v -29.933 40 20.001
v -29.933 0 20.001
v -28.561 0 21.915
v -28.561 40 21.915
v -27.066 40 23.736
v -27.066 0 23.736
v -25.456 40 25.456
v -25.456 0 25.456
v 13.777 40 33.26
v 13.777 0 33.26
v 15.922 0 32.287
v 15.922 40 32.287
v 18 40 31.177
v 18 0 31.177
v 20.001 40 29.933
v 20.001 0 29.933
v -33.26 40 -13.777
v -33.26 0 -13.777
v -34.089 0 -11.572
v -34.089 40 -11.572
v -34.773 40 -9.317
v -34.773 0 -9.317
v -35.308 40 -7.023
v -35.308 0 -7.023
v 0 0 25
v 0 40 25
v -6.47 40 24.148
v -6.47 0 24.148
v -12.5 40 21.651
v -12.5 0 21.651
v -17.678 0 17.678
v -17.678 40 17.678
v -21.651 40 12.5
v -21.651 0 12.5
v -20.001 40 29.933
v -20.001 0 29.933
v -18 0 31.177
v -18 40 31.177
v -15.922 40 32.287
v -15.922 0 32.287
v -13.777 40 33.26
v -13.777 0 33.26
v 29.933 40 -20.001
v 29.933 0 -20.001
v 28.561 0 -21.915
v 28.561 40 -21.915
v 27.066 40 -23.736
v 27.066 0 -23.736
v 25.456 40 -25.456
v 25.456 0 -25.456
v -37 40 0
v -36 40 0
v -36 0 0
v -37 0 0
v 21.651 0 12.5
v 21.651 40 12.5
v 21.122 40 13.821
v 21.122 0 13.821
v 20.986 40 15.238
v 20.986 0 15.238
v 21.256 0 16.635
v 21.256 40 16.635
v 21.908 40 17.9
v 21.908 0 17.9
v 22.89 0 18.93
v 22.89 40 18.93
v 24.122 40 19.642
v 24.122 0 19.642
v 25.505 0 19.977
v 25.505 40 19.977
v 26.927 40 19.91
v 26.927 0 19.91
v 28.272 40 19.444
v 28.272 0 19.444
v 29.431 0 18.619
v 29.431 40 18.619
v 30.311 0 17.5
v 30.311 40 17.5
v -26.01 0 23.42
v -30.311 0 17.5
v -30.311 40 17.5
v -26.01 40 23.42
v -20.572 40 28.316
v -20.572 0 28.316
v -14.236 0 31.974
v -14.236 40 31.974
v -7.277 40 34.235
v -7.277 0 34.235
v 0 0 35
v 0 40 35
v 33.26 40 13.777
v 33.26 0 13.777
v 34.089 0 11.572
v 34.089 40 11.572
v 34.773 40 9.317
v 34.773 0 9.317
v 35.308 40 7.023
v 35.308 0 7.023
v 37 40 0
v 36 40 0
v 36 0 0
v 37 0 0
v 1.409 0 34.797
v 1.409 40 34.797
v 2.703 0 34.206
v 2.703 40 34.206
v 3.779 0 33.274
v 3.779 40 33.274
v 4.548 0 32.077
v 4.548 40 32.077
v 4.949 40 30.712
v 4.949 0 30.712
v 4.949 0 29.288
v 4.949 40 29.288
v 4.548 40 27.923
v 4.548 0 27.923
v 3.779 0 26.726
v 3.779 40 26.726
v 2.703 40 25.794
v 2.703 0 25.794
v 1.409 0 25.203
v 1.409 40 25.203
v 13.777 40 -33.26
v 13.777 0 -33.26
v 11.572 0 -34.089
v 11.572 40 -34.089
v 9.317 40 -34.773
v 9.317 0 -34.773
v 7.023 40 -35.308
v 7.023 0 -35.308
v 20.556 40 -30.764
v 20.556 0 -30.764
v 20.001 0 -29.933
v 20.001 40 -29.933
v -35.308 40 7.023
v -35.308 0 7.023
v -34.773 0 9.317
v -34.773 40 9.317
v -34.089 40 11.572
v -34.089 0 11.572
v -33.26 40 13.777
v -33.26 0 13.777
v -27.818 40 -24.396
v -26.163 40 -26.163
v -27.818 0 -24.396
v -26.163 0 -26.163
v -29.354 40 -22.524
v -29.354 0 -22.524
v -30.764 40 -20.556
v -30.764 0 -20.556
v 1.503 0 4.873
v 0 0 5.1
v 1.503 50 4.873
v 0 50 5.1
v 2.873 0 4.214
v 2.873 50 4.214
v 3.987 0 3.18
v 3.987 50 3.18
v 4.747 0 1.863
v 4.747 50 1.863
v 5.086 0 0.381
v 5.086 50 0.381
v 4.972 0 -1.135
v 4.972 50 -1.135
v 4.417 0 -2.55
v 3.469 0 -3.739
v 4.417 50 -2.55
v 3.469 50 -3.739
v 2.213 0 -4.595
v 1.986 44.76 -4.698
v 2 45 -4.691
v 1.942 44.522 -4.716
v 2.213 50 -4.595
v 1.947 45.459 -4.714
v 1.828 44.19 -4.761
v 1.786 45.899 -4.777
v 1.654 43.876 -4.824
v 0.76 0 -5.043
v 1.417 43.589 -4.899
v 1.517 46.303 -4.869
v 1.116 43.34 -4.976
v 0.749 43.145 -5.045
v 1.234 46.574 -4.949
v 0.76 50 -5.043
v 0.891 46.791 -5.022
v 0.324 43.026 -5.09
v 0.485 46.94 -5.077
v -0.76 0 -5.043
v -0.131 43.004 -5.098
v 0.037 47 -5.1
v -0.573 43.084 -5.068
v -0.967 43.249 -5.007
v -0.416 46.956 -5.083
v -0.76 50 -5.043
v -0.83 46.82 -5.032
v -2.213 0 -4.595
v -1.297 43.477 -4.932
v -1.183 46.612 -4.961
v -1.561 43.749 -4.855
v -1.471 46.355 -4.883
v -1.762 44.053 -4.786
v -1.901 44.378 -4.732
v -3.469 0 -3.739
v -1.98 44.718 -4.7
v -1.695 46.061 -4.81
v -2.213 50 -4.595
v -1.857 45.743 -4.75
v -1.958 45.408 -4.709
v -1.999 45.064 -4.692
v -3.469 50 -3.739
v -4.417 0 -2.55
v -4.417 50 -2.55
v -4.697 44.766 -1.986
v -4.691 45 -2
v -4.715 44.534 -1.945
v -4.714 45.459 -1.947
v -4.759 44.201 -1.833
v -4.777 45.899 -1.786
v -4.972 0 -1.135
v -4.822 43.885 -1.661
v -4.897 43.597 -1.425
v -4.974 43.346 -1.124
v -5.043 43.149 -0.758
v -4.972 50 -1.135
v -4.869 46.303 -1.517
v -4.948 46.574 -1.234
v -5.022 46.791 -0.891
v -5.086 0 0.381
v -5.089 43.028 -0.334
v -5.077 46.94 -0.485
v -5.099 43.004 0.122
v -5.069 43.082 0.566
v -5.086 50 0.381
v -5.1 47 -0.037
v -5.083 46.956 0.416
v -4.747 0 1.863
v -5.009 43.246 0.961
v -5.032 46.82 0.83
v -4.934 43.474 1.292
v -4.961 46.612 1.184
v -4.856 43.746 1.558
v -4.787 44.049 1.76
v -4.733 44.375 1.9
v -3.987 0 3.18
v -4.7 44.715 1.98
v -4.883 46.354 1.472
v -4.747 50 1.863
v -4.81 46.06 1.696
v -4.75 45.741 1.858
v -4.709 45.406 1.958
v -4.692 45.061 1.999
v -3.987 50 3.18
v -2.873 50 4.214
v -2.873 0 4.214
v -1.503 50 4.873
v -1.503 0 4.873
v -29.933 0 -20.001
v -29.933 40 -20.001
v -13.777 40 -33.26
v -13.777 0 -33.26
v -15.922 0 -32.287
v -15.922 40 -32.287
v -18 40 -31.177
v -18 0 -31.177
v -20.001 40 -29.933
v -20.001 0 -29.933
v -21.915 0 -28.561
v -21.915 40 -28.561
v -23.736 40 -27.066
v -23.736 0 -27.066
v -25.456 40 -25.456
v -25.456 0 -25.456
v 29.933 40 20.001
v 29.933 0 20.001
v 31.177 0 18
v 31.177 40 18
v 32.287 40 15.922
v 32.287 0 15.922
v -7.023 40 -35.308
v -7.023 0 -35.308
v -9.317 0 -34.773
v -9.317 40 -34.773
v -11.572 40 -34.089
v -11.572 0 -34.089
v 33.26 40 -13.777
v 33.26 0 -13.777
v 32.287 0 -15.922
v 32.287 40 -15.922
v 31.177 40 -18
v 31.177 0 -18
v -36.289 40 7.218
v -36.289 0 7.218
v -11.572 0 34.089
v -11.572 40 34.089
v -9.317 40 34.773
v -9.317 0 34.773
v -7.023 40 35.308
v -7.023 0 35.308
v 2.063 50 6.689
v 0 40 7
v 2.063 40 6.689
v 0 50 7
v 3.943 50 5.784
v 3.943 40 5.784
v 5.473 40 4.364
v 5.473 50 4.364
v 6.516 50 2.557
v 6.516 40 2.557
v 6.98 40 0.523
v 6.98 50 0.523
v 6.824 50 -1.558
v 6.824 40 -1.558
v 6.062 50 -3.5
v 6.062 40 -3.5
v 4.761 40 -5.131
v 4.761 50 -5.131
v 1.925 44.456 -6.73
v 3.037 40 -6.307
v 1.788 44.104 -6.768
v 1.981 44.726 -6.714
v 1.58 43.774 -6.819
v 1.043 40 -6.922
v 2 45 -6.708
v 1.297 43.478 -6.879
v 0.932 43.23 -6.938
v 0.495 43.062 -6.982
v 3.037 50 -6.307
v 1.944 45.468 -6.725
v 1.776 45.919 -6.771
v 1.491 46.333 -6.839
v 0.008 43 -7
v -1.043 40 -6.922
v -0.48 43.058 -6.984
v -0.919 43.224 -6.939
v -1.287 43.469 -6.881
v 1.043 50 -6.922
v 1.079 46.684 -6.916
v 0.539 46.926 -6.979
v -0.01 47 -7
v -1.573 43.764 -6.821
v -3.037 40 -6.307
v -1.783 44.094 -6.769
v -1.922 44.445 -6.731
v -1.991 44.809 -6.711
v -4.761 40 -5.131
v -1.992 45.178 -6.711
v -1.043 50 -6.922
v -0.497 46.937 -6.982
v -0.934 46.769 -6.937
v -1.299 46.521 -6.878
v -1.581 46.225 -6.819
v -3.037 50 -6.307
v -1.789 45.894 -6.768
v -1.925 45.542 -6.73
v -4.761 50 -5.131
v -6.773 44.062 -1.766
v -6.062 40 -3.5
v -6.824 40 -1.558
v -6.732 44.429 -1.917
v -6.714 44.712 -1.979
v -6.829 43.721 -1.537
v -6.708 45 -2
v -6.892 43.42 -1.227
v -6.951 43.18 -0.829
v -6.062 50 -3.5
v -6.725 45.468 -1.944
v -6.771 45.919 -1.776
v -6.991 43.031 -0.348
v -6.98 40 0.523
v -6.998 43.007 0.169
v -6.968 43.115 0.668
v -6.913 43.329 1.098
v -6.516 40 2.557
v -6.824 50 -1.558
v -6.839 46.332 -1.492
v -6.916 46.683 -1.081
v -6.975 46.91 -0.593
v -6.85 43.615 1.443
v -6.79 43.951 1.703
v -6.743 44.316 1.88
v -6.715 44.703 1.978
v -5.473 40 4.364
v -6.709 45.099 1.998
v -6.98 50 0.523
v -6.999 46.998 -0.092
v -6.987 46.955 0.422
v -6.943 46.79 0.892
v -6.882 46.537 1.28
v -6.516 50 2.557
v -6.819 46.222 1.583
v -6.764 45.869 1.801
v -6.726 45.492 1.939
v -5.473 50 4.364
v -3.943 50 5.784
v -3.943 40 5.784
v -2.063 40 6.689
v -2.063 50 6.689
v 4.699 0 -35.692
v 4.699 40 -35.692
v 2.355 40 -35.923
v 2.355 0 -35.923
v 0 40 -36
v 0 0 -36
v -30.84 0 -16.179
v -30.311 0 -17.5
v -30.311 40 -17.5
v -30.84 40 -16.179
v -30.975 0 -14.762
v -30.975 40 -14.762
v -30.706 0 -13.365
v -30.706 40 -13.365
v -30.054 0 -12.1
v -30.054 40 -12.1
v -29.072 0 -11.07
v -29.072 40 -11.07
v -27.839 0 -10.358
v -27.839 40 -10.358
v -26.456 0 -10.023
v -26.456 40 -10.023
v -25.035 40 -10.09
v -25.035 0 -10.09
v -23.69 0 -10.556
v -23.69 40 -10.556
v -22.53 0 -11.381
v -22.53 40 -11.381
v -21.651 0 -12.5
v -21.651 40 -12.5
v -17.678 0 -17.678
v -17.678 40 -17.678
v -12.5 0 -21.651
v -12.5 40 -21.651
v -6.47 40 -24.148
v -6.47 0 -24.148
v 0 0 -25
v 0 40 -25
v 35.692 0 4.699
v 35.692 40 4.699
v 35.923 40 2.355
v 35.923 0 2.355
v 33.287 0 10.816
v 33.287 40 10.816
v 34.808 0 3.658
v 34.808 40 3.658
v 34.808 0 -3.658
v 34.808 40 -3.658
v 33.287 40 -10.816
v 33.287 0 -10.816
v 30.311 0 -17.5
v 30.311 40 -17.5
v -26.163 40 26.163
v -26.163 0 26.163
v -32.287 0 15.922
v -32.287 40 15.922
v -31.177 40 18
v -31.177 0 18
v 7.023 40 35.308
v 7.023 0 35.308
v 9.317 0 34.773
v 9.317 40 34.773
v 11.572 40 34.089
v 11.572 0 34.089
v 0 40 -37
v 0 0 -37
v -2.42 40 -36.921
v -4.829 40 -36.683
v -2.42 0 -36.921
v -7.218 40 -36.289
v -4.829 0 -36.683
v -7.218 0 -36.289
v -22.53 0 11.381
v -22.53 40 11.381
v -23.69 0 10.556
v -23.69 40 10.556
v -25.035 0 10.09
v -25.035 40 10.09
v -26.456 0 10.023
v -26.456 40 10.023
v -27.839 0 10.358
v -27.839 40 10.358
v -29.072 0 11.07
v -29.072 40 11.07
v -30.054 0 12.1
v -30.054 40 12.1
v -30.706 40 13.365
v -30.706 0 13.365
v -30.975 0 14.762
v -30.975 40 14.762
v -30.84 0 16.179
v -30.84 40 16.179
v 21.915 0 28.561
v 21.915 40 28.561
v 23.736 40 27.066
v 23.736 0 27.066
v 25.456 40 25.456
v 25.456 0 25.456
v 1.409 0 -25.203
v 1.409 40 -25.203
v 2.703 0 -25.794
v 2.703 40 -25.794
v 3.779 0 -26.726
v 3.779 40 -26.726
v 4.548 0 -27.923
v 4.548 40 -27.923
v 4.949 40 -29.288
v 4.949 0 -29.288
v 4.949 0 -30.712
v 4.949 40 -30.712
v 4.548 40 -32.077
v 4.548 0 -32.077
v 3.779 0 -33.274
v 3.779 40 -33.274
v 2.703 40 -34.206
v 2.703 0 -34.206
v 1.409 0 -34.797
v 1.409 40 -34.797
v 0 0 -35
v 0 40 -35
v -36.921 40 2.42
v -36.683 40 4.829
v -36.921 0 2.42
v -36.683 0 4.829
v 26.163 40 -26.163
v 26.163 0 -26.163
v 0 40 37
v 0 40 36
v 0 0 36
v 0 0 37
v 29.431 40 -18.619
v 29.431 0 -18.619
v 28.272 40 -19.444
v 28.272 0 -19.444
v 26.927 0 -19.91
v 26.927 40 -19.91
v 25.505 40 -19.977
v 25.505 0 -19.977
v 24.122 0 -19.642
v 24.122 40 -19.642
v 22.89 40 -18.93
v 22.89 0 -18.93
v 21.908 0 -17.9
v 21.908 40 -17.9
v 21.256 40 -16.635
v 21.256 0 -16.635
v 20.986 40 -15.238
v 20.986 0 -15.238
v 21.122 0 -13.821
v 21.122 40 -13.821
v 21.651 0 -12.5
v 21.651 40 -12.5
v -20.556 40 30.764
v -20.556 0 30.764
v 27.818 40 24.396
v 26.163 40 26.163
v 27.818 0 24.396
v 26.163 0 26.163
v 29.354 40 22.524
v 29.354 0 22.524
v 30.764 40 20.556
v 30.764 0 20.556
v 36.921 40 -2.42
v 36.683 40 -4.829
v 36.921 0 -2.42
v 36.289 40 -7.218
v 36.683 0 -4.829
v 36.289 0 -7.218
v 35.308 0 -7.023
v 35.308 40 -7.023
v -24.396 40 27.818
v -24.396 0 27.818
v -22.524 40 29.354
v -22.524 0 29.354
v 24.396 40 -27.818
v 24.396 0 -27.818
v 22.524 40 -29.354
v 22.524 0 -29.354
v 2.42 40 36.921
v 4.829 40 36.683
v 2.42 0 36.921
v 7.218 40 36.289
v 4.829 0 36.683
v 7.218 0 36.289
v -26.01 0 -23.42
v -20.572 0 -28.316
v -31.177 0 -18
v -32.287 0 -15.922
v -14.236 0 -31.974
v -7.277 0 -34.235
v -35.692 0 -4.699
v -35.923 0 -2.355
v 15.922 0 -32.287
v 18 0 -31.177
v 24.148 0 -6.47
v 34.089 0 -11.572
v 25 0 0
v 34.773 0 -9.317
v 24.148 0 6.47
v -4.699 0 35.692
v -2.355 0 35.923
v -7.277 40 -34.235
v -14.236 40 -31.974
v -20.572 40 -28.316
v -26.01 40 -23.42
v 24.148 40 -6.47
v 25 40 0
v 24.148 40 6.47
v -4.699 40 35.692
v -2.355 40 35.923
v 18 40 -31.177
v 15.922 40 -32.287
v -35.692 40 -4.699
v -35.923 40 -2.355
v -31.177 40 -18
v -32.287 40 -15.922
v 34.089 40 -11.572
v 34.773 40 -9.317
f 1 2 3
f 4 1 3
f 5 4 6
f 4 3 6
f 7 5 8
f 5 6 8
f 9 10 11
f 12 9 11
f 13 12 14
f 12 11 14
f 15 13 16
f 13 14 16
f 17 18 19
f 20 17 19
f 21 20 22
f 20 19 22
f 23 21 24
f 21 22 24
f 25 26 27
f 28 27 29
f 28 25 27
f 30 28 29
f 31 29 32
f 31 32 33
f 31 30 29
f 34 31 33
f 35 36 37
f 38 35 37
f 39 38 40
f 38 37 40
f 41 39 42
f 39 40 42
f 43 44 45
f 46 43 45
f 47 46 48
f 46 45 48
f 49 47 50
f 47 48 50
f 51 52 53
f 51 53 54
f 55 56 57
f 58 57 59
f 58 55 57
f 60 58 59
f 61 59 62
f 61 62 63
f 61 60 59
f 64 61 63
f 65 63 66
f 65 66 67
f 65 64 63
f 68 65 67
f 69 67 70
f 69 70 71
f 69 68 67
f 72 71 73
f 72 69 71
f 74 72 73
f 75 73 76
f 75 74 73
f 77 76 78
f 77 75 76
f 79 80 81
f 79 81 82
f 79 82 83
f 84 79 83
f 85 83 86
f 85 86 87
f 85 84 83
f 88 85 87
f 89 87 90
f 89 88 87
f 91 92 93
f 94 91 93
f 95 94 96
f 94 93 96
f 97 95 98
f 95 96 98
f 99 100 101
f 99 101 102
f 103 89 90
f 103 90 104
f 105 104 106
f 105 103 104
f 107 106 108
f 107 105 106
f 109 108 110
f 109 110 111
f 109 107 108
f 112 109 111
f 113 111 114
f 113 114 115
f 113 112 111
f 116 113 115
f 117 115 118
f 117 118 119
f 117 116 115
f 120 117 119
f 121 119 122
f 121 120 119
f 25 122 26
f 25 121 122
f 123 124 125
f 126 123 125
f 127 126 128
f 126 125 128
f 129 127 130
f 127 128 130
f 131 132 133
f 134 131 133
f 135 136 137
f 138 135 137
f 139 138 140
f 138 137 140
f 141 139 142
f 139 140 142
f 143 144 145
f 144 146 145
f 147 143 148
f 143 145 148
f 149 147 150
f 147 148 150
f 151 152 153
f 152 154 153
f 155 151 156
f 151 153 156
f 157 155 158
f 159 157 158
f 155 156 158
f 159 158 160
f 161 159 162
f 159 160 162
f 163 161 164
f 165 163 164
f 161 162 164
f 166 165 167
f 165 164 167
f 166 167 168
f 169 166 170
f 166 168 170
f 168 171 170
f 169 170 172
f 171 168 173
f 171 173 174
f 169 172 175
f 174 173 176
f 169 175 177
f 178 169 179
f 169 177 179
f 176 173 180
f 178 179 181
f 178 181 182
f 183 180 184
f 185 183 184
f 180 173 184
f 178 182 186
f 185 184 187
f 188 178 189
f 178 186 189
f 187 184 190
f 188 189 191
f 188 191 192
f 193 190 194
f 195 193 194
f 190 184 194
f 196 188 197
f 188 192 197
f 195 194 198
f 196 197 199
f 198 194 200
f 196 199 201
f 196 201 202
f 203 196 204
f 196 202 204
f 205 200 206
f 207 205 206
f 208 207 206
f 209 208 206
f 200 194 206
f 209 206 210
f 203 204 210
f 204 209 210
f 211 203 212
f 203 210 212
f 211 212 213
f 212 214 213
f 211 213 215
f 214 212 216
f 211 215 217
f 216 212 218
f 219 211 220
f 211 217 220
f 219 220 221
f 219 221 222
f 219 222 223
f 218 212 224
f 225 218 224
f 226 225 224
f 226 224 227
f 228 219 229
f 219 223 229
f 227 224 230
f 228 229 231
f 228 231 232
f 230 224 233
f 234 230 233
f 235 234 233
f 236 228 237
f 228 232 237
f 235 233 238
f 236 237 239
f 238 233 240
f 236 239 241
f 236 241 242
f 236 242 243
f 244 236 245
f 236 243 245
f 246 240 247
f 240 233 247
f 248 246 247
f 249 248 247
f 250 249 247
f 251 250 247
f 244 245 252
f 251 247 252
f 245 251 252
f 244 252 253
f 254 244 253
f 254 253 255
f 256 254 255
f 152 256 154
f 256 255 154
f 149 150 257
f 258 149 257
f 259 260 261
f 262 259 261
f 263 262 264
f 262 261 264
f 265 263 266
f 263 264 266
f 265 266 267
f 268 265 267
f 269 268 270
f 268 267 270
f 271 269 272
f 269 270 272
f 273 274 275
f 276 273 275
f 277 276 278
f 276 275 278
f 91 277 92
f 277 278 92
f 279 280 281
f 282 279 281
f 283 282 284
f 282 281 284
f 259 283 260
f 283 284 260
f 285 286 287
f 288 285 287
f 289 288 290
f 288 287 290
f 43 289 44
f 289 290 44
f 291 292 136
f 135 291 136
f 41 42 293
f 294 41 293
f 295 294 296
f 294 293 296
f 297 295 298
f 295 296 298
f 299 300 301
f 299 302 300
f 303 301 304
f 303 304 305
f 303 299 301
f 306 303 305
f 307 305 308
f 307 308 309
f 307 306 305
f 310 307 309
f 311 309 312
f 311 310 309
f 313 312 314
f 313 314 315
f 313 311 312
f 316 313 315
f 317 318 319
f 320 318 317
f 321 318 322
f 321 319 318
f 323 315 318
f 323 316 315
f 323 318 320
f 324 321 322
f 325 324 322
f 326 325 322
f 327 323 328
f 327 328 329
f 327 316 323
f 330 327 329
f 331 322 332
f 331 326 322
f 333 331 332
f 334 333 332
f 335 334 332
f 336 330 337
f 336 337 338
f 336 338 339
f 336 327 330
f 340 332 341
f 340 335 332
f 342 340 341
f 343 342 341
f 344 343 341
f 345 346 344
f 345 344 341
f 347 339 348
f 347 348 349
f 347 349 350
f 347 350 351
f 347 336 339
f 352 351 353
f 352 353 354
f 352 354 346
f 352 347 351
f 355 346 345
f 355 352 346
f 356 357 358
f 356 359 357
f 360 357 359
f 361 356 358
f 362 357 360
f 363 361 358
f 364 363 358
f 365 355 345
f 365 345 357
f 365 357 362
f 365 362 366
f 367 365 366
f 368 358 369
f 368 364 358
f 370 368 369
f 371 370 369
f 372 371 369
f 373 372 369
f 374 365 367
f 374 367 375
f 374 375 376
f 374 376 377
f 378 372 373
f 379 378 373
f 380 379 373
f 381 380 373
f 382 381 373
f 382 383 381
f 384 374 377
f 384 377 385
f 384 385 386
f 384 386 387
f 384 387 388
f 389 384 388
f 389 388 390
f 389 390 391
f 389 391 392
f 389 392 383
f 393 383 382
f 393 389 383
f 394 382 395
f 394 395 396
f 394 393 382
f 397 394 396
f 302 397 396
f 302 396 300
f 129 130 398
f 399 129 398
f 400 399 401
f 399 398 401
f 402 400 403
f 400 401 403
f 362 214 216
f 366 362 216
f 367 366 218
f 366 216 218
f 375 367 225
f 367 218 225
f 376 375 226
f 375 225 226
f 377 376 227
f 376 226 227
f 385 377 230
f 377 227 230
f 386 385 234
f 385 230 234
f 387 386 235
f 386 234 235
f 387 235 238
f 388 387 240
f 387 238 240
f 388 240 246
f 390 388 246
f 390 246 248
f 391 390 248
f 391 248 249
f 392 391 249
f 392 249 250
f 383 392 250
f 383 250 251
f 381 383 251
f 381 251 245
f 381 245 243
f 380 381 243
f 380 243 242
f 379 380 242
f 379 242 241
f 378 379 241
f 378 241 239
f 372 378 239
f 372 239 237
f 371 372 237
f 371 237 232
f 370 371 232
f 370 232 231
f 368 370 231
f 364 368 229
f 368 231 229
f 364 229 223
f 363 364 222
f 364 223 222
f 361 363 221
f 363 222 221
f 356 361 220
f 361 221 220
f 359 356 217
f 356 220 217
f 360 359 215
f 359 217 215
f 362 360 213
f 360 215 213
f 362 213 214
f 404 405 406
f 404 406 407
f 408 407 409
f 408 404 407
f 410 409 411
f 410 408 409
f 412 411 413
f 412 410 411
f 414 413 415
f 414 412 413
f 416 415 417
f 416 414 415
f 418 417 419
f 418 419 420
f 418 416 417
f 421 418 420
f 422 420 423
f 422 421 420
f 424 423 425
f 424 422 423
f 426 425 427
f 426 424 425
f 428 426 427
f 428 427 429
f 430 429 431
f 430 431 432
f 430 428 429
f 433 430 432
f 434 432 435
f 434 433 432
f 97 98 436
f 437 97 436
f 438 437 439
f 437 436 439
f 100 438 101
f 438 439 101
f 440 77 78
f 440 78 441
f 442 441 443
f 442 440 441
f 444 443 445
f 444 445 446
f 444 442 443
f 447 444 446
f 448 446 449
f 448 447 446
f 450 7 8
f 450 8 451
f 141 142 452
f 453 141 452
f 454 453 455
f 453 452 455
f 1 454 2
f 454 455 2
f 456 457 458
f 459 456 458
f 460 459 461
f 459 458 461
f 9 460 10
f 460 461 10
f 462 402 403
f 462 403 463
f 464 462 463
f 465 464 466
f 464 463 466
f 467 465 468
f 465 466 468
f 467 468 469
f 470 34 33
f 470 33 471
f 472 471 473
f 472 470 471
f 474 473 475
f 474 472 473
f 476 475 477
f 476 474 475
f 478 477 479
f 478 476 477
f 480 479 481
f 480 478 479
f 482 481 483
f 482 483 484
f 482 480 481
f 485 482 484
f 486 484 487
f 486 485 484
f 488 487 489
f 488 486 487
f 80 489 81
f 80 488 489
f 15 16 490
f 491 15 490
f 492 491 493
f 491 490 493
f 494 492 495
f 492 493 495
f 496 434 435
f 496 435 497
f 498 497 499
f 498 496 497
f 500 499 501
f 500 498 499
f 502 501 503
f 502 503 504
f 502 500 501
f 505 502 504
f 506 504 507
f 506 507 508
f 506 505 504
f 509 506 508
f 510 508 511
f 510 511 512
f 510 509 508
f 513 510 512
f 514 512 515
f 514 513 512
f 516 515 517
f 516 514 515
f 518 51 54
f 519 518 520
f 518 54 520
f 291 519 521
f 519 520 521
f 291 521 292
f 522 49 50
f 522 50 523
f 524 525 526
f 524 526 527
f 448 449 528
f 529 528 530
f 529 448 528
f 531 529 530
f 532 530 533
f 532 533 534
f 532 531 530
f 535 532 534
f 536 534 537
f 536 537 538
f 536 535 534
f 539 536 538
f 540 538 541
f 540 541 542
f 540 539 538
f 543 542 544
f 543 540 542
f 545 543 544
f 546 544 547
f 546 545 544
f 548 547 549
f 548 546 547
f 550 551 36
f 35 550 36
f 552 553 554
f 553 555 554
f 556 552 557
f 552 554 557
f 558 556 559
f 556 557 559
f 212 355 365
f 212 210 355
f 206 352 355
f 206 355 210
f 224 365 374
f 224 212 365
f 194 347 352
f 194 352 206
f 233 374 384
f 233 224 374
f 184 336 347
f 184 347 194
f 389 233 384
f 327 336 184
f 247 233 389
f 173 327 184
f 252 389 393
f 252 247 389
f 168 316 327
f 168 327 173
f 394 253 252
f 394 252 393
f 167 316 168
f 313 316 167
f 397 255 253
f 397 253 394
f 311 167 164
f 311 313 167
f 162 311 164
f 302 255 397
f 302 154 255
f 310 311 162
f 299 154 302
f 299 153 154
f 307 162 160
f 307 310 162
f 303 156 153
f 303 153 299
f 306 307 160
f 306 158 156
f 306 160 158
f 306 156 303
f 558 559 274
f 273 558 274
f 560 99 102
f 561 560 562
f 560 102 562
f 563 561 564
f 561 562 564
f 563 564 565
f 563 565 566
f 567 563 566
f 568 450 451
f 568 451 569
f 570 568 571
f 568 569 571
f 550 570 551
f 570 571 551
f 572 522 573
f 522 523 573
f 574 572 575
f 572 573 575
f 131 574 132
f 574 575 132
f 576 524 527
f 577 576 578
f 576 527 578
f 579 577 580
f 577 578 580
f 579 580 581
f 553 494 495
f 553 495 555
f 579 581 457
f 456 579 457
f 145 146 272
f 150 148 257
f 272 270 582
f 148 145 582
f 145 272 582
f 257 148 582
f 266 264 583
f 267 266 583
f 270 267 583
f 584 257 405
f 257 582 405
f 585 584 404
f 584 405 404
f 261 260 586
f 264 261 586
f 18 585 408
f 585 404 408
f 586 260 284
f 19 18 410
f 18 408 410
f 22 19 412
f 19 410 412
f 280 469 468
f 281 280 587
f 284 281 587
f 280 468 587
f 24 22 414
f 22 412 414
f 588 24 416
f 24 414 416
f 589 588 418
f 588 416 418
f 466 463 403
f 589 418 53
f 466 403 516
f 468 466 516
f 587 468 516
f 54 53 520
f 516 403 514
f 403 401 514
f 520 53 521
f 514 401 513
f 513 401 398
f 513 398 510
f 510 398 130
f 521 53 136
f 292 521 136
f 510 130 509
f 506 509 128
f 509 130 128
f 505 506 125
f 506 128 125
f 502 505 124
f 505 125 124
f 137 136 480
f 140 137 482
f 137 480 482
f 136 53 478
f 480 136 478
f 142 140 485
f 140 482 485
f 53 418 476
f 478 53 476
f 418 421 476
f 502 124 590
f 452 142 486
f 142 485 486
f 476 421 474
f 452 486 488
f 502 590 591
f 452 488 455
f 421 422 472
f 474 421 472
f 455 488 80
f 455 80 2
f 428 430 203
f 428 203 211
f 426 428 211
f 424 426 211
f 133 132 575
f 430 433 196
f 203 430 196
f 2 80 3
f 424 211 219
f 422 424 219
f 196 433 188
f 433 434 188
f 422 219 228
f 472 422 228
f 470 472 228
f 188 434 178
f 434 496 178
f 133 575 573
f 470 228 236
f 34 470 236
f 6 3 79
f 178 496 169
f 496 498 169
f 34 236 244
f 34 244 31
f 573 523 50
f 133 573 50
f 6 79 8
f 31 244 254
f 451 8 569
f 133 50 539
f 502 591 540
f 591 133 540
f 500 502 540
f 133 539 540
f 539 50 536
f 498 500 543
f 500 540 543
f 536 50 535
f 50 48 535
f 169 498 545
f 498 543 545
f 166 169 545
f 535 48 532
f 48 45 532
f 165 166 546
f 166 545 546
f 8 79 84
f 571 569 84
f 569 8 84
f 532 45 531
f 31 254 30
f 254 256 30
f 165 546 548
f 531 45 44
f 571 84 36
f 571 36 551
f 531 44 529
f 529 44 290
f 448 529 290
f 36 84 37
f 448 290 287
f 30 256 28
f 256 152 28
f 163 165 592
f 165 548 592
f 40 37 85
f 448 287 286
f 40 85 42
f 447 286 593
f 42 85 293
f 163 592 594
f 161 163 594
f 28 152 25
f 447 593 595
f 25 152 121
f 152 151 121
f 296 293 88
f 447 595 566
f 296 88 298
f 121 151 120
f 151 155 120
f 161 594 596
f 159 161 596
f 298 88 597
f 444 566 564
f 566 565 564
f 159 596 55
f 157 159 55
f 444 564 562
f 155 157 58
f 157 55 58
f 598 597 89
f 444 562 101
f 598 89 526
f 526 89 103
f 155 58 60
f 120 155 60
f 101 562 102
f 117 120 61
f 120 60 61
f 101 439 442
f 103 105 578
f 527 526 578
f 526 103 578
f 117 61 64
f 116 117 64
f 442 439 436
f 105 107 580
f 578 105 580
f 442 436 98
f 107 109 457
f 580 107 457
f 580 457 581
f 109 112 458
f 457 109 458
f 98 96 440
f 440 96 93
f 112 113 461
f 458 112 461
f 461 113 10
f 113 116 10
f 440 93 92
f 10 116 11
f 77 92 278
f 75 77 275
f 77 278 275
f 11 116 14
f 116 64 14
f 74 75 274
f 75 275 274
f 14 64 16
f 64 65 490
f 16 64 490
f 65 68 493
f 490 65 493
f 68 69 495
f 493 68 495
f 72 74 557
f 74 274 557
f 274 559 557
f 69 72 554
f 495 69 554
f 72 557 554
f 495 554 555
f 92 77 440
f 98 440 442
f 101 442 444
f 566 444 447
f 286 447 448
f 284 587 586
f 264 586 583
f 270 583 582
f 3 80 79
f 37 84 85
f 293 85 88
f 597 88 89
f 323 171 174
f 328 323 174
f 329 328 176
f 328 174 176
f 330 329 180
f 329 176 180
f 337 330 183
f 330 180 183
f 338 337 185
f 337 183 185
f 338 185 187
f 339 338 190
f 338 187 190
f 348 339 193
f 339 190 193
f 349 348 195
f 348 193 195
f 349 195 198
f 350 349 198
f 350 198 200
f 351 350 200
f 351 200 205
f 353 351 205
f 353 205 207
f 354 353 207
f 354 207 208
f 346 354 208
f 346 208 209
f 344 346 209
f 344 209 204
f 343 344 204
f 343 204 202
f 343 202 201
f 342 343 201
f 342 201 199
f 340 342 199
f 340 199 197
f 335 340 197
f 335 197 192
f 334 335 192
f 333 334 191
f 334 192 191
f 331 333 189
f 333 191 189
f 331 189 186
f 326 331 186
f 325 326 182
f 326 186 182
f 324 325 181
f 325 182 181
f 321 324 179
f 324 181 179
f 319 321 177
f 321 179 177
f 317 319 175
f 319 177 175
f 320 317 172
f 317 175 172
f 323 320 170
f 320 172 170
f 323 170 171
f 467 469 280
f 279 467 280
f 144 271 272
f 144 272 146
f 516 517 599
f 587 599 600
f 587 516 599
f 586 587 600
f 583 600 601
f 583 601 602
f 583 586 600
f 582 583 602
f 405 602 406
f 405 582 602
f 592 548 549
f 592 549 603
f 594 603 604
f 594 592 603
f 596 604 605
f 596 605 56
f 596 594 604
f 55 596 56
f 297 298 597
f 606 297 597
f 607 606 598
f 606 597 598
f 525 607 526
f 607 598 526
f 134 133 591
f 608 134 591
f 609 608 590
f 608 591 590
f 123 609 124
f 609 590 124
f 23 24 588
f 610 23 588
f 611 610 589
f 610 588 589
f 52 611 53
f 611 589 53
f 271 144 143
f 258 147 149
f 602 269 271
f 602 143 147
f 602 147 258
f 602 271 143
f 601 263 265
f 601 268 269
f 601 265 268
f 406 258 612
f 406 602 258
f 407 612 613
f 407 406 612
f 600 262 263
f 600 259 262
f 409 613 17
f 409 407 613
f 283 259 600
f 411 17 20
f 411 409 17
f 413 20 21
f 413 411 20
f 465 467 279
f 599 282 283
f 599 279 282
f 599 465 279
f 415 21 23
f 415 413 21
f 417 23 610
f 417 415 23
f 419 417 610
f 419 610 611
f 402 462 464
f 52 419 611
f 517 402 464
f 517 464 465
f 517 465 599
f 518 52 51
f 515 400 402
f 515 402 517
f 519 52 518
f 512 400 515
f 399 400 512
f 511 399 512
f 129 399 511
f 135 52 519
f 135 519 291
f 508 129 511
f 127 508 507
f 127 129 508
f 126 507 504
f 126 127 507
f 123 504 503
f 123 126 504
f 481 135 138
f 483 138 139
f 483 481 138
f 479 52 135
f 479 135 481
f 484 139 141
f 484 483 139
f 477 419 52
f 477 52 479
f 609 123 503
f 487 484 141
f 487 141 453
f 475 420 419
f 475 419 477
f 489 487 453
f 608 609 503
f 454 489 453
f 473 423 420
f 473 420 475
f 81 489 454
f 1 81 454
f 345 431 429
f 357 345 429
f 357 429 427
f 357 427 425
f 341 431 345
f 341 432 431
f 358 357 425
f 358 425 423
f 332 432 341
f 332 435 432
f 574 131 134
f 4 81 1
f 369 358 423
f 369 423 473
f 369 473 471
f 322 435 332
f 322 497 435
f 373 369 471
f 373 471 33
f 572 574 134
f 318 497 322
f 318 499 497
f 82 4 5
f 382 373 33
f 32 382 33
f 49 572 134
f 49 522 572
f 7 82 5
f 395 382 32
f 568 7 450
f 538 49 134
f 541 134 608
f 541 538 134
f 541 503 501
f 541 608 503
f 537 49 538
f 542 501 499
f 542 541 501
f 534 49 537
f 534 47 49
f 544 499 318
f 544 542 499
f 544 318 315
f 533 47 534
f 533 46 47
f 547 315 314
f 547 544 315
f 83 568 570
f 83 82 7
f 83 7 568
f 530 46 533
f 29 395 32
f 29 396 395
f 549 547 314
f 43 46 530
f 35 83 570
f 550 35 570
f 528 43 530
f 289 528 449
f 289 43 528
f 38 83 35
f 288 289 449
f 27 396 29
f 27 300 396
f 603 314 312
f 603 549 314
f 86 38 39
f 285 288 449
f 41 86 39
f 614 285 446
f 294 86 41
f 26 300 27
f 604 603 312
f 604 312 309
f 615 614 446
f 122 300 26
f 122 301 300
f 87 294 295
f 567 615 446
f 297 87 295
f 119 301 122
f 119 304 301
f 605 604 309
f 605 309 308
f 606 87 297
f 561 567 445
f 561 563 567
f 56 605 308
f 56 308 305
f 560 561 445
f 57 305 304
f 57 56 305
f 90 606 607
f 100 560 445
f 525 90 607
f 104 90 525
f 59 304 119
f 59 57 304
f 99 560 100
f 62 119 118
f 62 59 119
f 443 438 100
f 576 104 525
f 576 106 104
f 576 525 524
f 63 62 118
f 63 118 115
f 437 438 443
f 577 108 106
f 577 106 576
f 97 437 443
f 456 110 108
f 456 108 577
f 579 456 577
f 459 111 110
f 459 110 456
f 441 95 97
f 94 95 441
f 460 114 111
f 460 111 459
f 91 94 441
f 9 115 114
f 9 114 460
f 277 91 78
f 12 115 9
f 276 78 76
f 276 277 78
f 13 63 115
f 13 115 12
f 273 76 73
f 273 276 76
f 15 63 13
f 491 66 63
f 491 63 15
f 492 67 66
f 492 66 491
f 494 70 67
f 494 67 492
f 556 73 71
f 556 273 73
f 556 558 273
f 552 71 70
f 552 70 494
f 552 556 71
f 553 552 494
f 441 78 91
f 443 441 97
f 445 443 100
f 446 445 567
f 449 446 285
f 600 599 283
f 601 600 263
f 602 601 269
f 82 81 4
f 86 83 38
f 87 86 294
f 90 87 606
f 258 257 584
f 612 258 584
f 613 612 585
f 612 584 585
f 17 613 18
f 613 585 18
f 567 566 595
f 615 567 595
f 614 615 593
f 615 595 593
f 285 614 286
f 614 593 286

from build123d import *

# Parameters (mm, degrees)
SKETCH_1_R               = 37
EXTRUDE_1_DEPTH          = 40
SKETCH_2_R               = 5.1
CUT_EXTRUDE_1_DEPTH      = 40
CUT_EXTRUDE_START        = -40
CUT_EXTRUDE_2_DEPTH      = 40
SKETCH_4_R               = 7
SKETCH_4_R_2             = 5.1
EXTRUDE_2_DEPTH          = 10
CUT_EXTRUDE_3_REACH      = 74.374
CUT_EXTRUDE_3_END_RADIUS = 7
SKETCH_6_R               = 2
CUT_EXTRUDE_4_REACH      = 74.374
CUT_EXTRUDE_4_END_RADIUS = 7
SKETCH_7_R               = 2
CUT_EXTRUDE_7_REACH      = 74.374


# Read off the part's stored shape, not the designer's step: the extrude step
with BuildPart() as part:
    # 草图1 → 凸台-拉伸1 (new body)
    with BuildSketch(Plane(origin=(0, 0, 0), x_dir=(1, 0, 0), z_dir=(0, 1, 0))):
        with Locations(Location((0, 0, 0), (0, 0, 270))):
            Circle(SKETCH_1_R)
    extrude(amount=EXTRUDE_1_DEPTH)

    # 草图2 → 切除-拉伸1 (cut)
    with BuildSketch(Plane(origin=(0, 40, 0), x_dir=(1, 0, 0), z_dir=(0, 1, 0))):
        with Locations(Location((0, 0, 0), (0, 0, 270))):
            Circle(SKETCH_2_R)
    extrude(amount=-CUT_EXTRUDE_1_DEPTH, mode=Mode.SUBTRACT)

    # 切除-拉伸2 outline → 切除-拉伸2 (cut)
    with BuildSketch(Plane(origin=(0, 40, 0), x_dir=(1, 0, 0), z_dir=(0, 1, 0)).offset(CUT_EXTRUDE_START)):
        with BuildLine():
            ThreePointArc((0, 25), (5, 30), (0, 35))
            ThreePointArc((0, 35), (-17.5, 30.310889132), (-30.310889132, 17.5))
            ThreePointArc((-30.310889132, 17.5), (-28.480762114, 10.669872981), (-21.650635095, 12.5))
            ThreePointArc((-21.650635095, 12.5), (-12.5, 21.650635095), (0, 25))
        make_face()
        with BuildLine():
            ThreePointArc((-21.650635095, -12.5), (-28.480762114, -10.669872981), (-30.310889132, -17.5))
            ThreePointArc((-30.310889132, -17.5), (-17.5, -30.310889132), (0, -35))
            ThreePointArc((0, -35), (5, -30), (0, -25))
            ThreePointArc((0, -25), (-12.5, -21.650635095), (-21.650635095, -12.5))
        make_face()
        with BuildLine():
            ThreePointArc((21.650635095, -12.5), (23.480762113, -19.330127019), (30.310889132, -17.5))
            ThreePointArc((30.310889132, -17.5), (35, 0), (30.310889132, 17.5))
            ThreePointArc((30.310889132, 17.5), (23.480762113, 19.330127019), (21.650635095, 12.5))
            ThreePointArc((21.650635095, 12.5), (25, 0), (21.650635095, -12.5))
        make_face()
    extrude(amount=CUT_EXTRUDE_2_DEPTH, mode=Mode.SUBTRACT)

    # 草图4 → 凸台-拉伸2 (add, symmetric)
    with BuildSketch(Plane(origin=(0, 40, 0), x_dir=(1, 0, 0), z_dir=(0, 1, 0))):
        with Locations(Location((0, 0, 0), (0, 0, 270))):
            Circle(SKETCH_4_R)
        with Locations(Location((0, 0, 0), (0, 0, 270))):
            Circle(SKETCH_4_R_2, mode=Mode.SUBTRACT)
    extrude(amount=EXTRUDE_2_DEPTH, both=True)

    # 切除-拉伸3: up to this cylinder (the profile starts inside it)
    cut_extrude_3_end = Plane(origin=(0, 45, 0), z_dir=(0, -1, 0)) * Cylinder(CUT_EXTRUDE_3_END_RADIUS, 163.748, mode=Mode.PRIVATE)
    # 草图6 → 切除-拉伸3 (cut, up to the surface)
    with BuildSketch(Plane.XY, mode=Mode.PRIVATE) as cut_extrude_3_sk1:
        with Locations((0, 45)):
            Circle(SKETCH_6_R)
    cut_extrude_3_tool1 = extrude(cut_extrude_3_sk1.sketch, amount=-CUT_EXTRUDE_3_REACH, mode=Mode.PRIVATE) & cut_extrude_3_end
    add(cut_extrude_3_tool1.solids().sort_by_distance((0, 45, 0))[0], mode=Mode.SUBTRACT)

    # 切除-拉伸4: up to this cylinder (the profile starts inside it)
    cut_extrude_4_end = Plane(origin=(0, 45, 0), z_dir=(0, -1, 0)) * Cylinder(CUT_EXTRUDE_4_END_RADIUS, 163.748, mode=Mode.PRIVATE)
    # 草图7 → 切除-拉伸4 (cut, up to the surface)
    with BuildSketch(Plane(origin=(0, 0, 0), x_dir=(0, 0, -1), z_dir=(1, 0, 0)), mode=Mode.PRIVATE) as cut_extrude_4_sk1:
        with Locations((0, 45)):
            Circle(SKETCH_7_R)
    cut_extrude_4_tool1 = extrude(cut_extrude_4_sk1.sketch, amount=-CUT_EXTRUDE_4_REACH, mode=Mode.PRIVATE) & cut_extrude_4_end
    add(cut_extrude_4_tool1.solids().sort_by_distance((0, 45, 0))[0], mode=Mode.SUBTRACT)

    # 草图10 → 切除-拉伸7 (cut, up to next)
    with BuildSketch(Plane.XZ, mode=Mode.PRIVATE) as cut_extrude_7_sk1:
        with BuildLine():
            Line((-36.289055375, 7.218341915), (-35.308270095, 7.023251593))
            ThreePointArc((-35.308270095, 7.023251593), (-34.449852086, 10.450248381), (-33.25966317, 13.776603565))
            Line((-33.25966317, 13.776603565), (-34.183542703, 14.159286998))
            ThreePointArc((-34.183542703, 14.159286998), (-35.406792422, 10.740533058), (-36.289055375, 7.218341915))
        make_face()
    cut_extrude_7_tool1 = extrude(cut_extrude_7_sk1.sketch, amount=-CUT_EXTRUDE_7_REACH, mode=Mode.PRIVATE) & part.part
    # 草图10 → 切除-拉伸7 (cut, up to next)
    with BuildSketch(Plane.XZ, mode=Mode.PRIVATE) as cut_extrude_7_sk2:
        with BuildLine():
            Line((-34.183542703, 14.159286998), (-33.25966317, 13.776603565))
            ThreePointArc((-33.25966317, 13.776603565), (-31.749165517, 16.970282526), (-29.932906043, 20.000528389))
            Line((-29.932906043, 20.000528389), (-30.764375655, 20.556098622))
            ThreePointArc((-30.764375655, 20.556098622), (-32.631086781, 17.441679263), (-34.183542703, 14.159286998))
        make_face()
    cut_extrude_7_tool2 = extrude(cut_extrude_7_sk2.sketch, amount=-CUT_EXTRUDE_7_REACH, mode=Mode.PRIVATE) & part.part
    # 草图10 → 切除-拉伸7 (cut, up to next)
    with BuildSketch(Plane.XZ, mode=Mode.PRIVATE) as cut_extrude_7_sk3:
        with BuildLine():
            Line((-30.764375655, 20.556098622), (-29.932906043, 20.000528389))
            ThreePointArc((-29.932906043, 20.000528389), (-27.828376321, 22.83815823), (-25.455844123, 25.455844123))
            Line((-25.455844123, 25.455844123), (-26.162950904, 26.162950904))
            ThreePointArc((-26.162950904, 26.162950904), (-28.601386774, 23.472551514), (-30.764375655, 20.556098622))
        make_face()
    cut_extrude_7_tool3 = extrude(cut_extrude_7_sk3.sketch, amount=-CUT_EXTRUDE_7_REACH, mode=Mode.PRIVATE) & part.part
    # 草图10 → 切除-拉伸7 (cut, up to next)
    with BuildSketch(Plane.XZ, mode=Mode.PRIVATE) as cut_extrude_7_sk4:
        with BuildLine():
            Line((-20.556098622, 30.764375655), (-20.000528389, 29.932906043))
            ThreePointArc((-20.000528389, 29.932906043), (-16.970282526, 31.749165517), (-13.776603565, 33.25966317))
            Line((-13.776603565, 33.25966317), (-14.159286998, 34.183542703))
            ThreePointArc((-14.159286998, 34.183542703), (-17.441679263, 32.631086781), (-20.556098622, 30.764375655))
        make_face()
    cut_extrude_7_tool4 = extrude(cut_extrude_7_sk4.sketch, amount=-CUT_EXTRUDE_7_REACH, mode=Mode.PRIVATE) & part.part
    # 草图10 → 切除-拉伸7 (cut, up to next)
    with BuildSketch(Plane.XZ, mode=Mode.PRIVATE) as cut_extrude_7_sk5:
        with BuildLine():
            Line((-14.159286998, 34.183542703), (-13.776603565, 33.25966317))
            ThreePointArc((-13.776603565, 33.25966317), (-10.450248381, 34.449852086), (-7.023251593, 35.308270095))
            Line((-7.023251593, 35.308270095), (-7.218341915, 36.289055375))
            ThreePointArc((-7.218341915, 36.289055375), (-10.740533058, 35.406792422), (-14.159286998, 34.183542703))
        make_face()
    cut_extrude_7_tool5 = extrude(cut_extrude_7_sk5.sketch, amount=-CUT_EXTRUDE_7_REACH, mode=Mode.PRIVATE) & part.part
    # 草图10 → 切除-拉伸7 (cut, up to next)
    with BuildSketch(Plane.XZ, mode=Mode.PRIVATE) as cut_extrude_7_sk6:
        with BuildLine():
            ThreePointArc((-7.023251593, 35.308270095), (-3.528617052, 35.82665016), (0, 36))
            Line((0, 36), (0, 37))
            ThreePointArc((0, 37), (-3.626634192, 36.821834887), (-7.218341915, 36.289055375))
            Line((-7.218341915, 36.289055375), (-7.023251593, 35.308270095))
        make_face()
    cut_extrude_7_tool6 = extrude(cut_extrude_7_sk6.sketch, amount=-CUT_EXTRUDE_7_REACH, mode=Mode.PRIVATE) & part.part
    # 草图10 → 切除-拉伸7 (cut, up to next)
    with BuildSketch(Plane.XZ, mode=Mode.PRIVATE) as cut_extrude_7_sk7:
        with BuildLine():
            Line((7.218341915, 36.289055375), (7.023251593, 35.308270095))
            ThreePointArc((7.023251593, 35.308270095), (10.450248381, 34.449852086), (13.776603565, 33.25966317))
            Line((13.776603565, 33.25966317), (14.159286998, 34.183542703))
            ThreePointArc((14.159286998, 34.183542703), (10.740533058, 35.406792422), (7.218341915, 36.289055375))
        make_face()
    cut_extrude_7_tool7 = extrude(cut_extrude_7_sk7.sketch, amount=-CUT_EXTRUDE_7_REACH, mode=Mode.PRIVATE) & part.part
    # 草图10 → 切除-拉伸7 (cut, up to next)
    with BuildSketch(Plane.XZ, mode=Mode.PRIVATE) as cut_extrude_7_sk8:
        with BuildLine():
            Line((14.159286998, 34.183542703), (13.776603565, 33.25966317))
            ThreePointArc((13.776603565, 33.25966317), (16.970282526, 31.749165517), (20.000528389, 29.932906043))
            Line((20.000528389, 29.932906043), (20.556098622, 30.764375655))
            ThreePointArc((20.556098622, 30.764375655), (17.441679263, 32.631086781), (14.159286998, 34.183542703))
        make_face()
    cut_extrude_7_tool8 = extrude(cut_extrude_7_sk8.sketch, amount=-CUT_EXTRUDE_7_REACH, mode=Mode.PRIVATE) & part.part
    # 草图10 → 切除-拉伸7 (cut, up to next)
    with BuildSketch(Plane.XZ, mode=Mode.PRIVATE) as cut_extrude_7_sk9:
        with BuildLine():
            Line((20.556098622, 30.764375655), (20.000528389, 29.932906043))
            ThreePointArc((20.000528389, 29.932906043), (22.83815823, 27.828376321), (25.455844123, 25.455844123))
            Line((25.455844123, 25.455844123), (26.162950904, 26.162950904))
            ThreePointArc((26.162950904, 26.162950904), (23.472551514, 28.601386774), (20.556098622, 30.764375655))
        make_face()
    cut_extrude_7_tool9 = extrude(cut_extrude_7_sk9.sketch, amount=-CUT_EXTRUDE_7_REACH, mode=Mode.PRIVATE) & part.part
    # 草图10 → 切除-拉伸7 (cut, up to next)
    with BuildSketch(Plane.XZ, mode=Mode.PRIVATE) as cut_extrude_7_sk10:
        with BuildLine():
            Line((30.764375655, 20.556098622), (29.932906043, 20.000528389))
            ThreePointArc((29.932906043, 20.000528389), (31.749165517, 16.970282526), (33.25966317, 13.776603565))
            Line((33.25966317, 13.776603565), (34.183542703, 14.159286998))
            ThreePointArc((34.183542703, 14.159286998), (32.631086781, 17.441679263), (30.764375655, 20.556098622))
        make_face()
    cut_extrude_7_tool10 = extrude(cut_extrude_7_sk10.sketch, amount=-CUT_EXTRUDE_7_REACH, mode=Mode.PRIVATE) & part.part
    # 草图10 → 切除-拉伸7 (cut, up to next)
    with BuildSketch(Plane.XZ, mode=Mode.PRIVATE) as cut_extrude_7_sk11:
        with BuildLine():
            Line((34.183542703, 14.159286998), (33.25966317, 13.776603565))
            ThreePointArc((33.25966317, 13.776603565), (34.449852086, 10.450248381), (35.308270095, 7.023251593))
            Line((35.308270095, 7.023251593), (36.289055375, 7.218341915))
            ThreePointArc((36.289055375, 7.218341915), (35.406792422, 10.740533058), (34.183542703, 14.159286998))
        make_face()
    cut_extrude_7_tool11 = extrude(cut_extrude_7_sk11.sketch, amount=-CUT_EXTRUDE_7_REACH, mode=Mode.PRIVATE) & part.part
    # 草图10 → 切除-拉伸7 (cut, up to next)
    with BuildSketch(Plane.XZ, mode=Mode.PRIVATE) as cut_extrude_7_sk12:
        with BuildLine():
            Line((36.289055375, 7.218341915), (35.308270095, 7.023251593))
            ThreePointArc((35.308270095, 7.023251593), (35.82665016, 3.528617052), (36, 0))
            Line((36, 0), (37, 0))
            ThreePointArc((37, 0), (36.821834887, 3.626634192), (36.289055375, 7.218341915))
        make_face()
    cut_extrude_7_tool12 = extrude(cut_extrude_7_sk12.sketch, amount=-CUT_EXTRUDE_7_REACH, mode=Mode.PRIVATE) & part.part
    # 草图10 → 切除-拉伸7 (cut, up to next)
    with BuildSketch(Plane.XZ, mode=Mode.PRIVATE) as cut_extrude_7_sk13:
        with BuildLine():
            Line((36.289055375, -7.218341915), (35.308270095, -7.023251593))
            ThreePointArc((35.308270095, -7.023251593), (34.449852086, -10.450248381), (33.25966317, -13.776603565))
            Line((33.25966317, -13.776603565), (34.183542703, -14.159286998))
            ThreePointArc((34.183542703, -14.159286998), (35.406792422, -10.740533058), (36.289055375, -7.218341915))
        make_face()
    cut_extrude_7_tool13 = extrude(cut_extrude_7_sk13.sketch, amount=-CUT_EXTRUDE_7_REACH, mode=Mode.PRIVATE) & part.part
    # 草图10 → 切除-拉伸7 (cut, up to next)
    with BuildSketch(Plane.XZ, mode=Mode.PRIVATE) as cut_extrude_7_sk14:
        with BuildLine():
            Line((34.183542703, -14.159286998), (33.25966317, -13.776603565))
            ThreePointArc((33.25966317, -13.776603565), (31.749165517, -16.970282526), (29.932906043, -20.000528389))
            Line((29.932906043, -20.000528389), (30.764375655, -20.556098622))
            ThreePointArc((30.764375655, -20.556098622), (32.631086781, -17.441679263), (34.183542703, -14.159286998))
        make_face()
    cut_extrude_7_tool14 = extrude(cut_extrude_7_sk14.sketch, amount=-CUT_EXTRUDE_7_REACH, mode=Mode.PRIVATE) & part.part
    # 草图10 → 切除-拉伸7 (cut, up to next)
    with BuildSketch(Plane.XZ, mode=Mode.PRIVATE) as cut_extrude_7_sk15:
        with BuildLine():
            Line((30.764375655, -20.556098622), (29.932906043, -20.000528389))
            ThreePointArc((29.932906043, -20.000528389), (27.828376321, -22.83815823), (25.455844123, -25.455844123))
            Line((25.455844123, -25.455844123), (26.162950904, -26.162950904))
            ThreePointArc((26.162950904, -26.162950904), (28.601386774, -23.472551514), (30.764375655, -20.556098622))
        make_face()
    cut_extrude_7_tool15 = extrude(cut_extrude_7_sk15.sketch, amount=-CUT_EXTRUDE_7_REACH, mode=Mode.PRIVATE) & part.part
    # 草图10 → 切除-拉伸7 (cut, up to next)
    with BuildSketch(Plane.XZ, mode=Mode.PRIVATE) as cut_extrude_7_sk16:
        with BuildLine():
            Line((20.556098622, -30.764375655), (20.000528389, -29.932906043))
            ThreePointArc((20.000528389, -29.932906043), (16.970282526, -31.749165517), (13.776603565, -33.25966317))
            Line((13.776603565, -33.25966317), (14.159286998, -34.183542703))
            ThreePointArc((14.159286998, -34.183542703), (17.441679263, -32.631086781), (20.556098622, -30.764375655))
        make_face()
    cut_extrude_7_tool16 = extrude(cut_extrude_7_sk16.sketch, amount=-CUT_EXTRUDE_7_REACH, mode=Mode.PRIVATE) & part.part
    # 草图10 → 切除-拉伸7 (cut, up to next)
    with BuildSketch(Plane.XZ, mode=Mode.PRIVATE) as cut_extrude_7_sk17:
        with BuildLine():
            Line((14.159286998, -34.183542703), (13.776603565, -33.25966317))
            ThreePointArc((13.776603565, -33.25966317), (10.450248381, -34.449852086), (7.023251593, -35.308270095))
            Line((7.023251593, -35.308270095), (7.218341915, -36.289055375))
            ThreePointArc((7.218341915, -36.289055375), (10.740533058, -35.406792422), (14.159286998, -34.183542703))
        make_face()
    cut_extrude_7_tool17 = extrude(cut_extrude_7_sk17.sketch, amount=-CUT_EXTRUDE_7_REACH, mode=Mode.PRIVATE) & part.part
    # 草图10 → 切除-拉伸7 (cut, up to next)
    with BuildSketch(Plane.XZ, mode=Mode.PRIVATE) as cut_extrude_7_sk18:
        with BuildLine():
            Line((7.218341915, -36.289055375), (7.023251593, -35.308270095))
            ThreePointArc((7.023251593, -35.308270095), (3.528617052, -35.82665016), (0, -36))
            Line((0, -36), (0, -37))
            ThreePointArc((0, -37), (3.626634192, -36.821834887), (7.218341915, -36.289055375))
        make_face()
    cut_extrude_7_tool18 = extrude(cut_extrude_7_sk18.sketch, amount=-CUT_EXTRUDE_7_REACH, mode=Mode.PRIVATE) & part.part
    # 草图10 → 切除-拉伸7 (cut, up to next)
    with BuildSketch(Plane.XZ, mode=Mode.PRIVATE) as cut_extrude_7_sk19:
        with BuildLine():
            Line((-7.218341915, -36.289055375), (-7.023251593, -35.308270095))
            ThreePointArc((-7.023251593, -35.308270095), (-10.450248381, -34.449852086), (-13.776603565, -33.25966317))
            Line((-13.776603565, -33.25966317), (-14.159286998, -34.183542703))
            ThreePointArc((-14.159286998, -34.183542703), (-10.740533058, -35.406792422), (-7.218341915, -36.289055375))
        make_face()
    cut_extrude_7_tool19 = extrude(cut_extrude_7_sk19.sketch, amount=-CUT_EXTRUDE_7_REACH, mode=Mode.PRIVATE) & part.part
    # 草图10 → 切除-拉伸7 (cut, up to next)
    with BuildSketch(Plane.XZ, mode=Mode.PRIVATE) as cut_extrude_7_sk20:
        with BuildLine():
            Line((-14.159286998, -34.183542703), (-13.776603565, -33.25966317))
            ThreePointArc((-13.776603565, -33.25966317), (-16.970282526, -31.749165517), (-20.000528389, -29.932906043))
            Line((-20.000528389, -29.932906043), (-20.556098622, -30.764375655))
            ThreePointArc((-20.556098622, -30.764375655), (-17.441679263, -32.631086781), (-14.159286998, -34.183542703))
        make_face()
    cut_extrude_7_tool20 = extrude(cut_extrude_7_sk20.sketch, amount=-CUT_EXTRUDE_7_REACH, mode=Mode.PRIVATE) & part.part
    # 草图10 → 切除-拉伸7 (cut, up to next)
    with BuildSketch(Plane.XZ, mode=Mode.PRIVATE) as cut_extrude_7_sk21:
        with BuildLine():
            Line((-20.556098622, -30.764375655), (-20.000528389, -29.932906043))
            ThreePointArc((-20.000528389, -29.932906043), (-22.83815823, -27.828376321), (-25.455844123, -25.455844123))
            Line((-25.455844123, -25.455844123), (-26.162950904, -26.162950904))
            ThreePointArc((-26.162950904, -26.162950904), (-23.472551514, -28.601386774), (-20.556098622, -30.764375655))
        make_face()
    cut_extrude_7_tool21 = extrude(cut_extrude_7_sk21.sketch, amount=-CUT_EXTRUDE_7_REACH, mode=Mode.PRIVATE) & part.part
    # 草图10 → 切除-拉伸7 (cut, up to next)
    with BuildSketch(Plane.XZ, mode=Mode.PRIVATE) as cut_extrude_7_sk22:
        with BuildLine():
            Line((-30.764375655, -20.556098622), (-29.932906043, -20.000528389))
            ThreePointArc((-29.932906043, -20.000528389), (-31.749165517, -16.970282526), (-33.25966317, -13.776603565))
            Line((-33.25966317, -13.776603565), (-34.183542703, -14.159286998))
            ThreePointArc((-34.183542703, -14.159286998), (-32.631086781, -17.441679263), (-30.764375655, -20.556098622))
        make_face()
    cut_extrude_7_tool22 = extrude(cut_extrude_7_sk22.sketch, amount=-CUT_EXTRUDE_7_REACH, mode=Mode.PRIVATE) & part.part
    # 草图10 → 切除-拉伸7 (cut, up to next)
    with BuildSketch(Plane.XZ, mode=Mode.PRIVATE) as cut_extrude_7_sk23:
        with BuildLine():
            Line((-34.183542703, -14.159286998), (-33.25966317, -13.776603565))
            ThreePointArc((-33.25966317, -13.776603565), (-34.449852086, -10.450248381), (-35.308270095, -7.023251593))
            Line((-35.308270095, -7.023251593), (-36.289055375, -7.218341915))
            ThreePointArc((-36.289055375, -7.218341915), (-35.406792422, -10.740533058), (-34.183542703, -14.159286998))
        make_face()
    cut_extrude_7_tool23 = extrude(cut_extrude_7_sk23.sketch, amount=-CUT_EXTRUDE_7_REACH, mode=Mode.PRIVATE) & part.part
    # 草图10 → 切除-拉伸7 (cut, up to next)
    with BuildSketch(Plane.XZ, mode=Mode.PRIVATE) as cut_extrude_7_sk24:
        with BuildLine():
            Line((-36.289055375, -7.218341915), (-35.308270095, -7.023251593))
            ThreePointArc((-35.308270095, -7.023251593), (-35.82665016, -3.528617052), (-36, 0))
            Line((-36, 0), (-37, 0))
            ThreePointArc((-37, 0), (-36.821834887, -3.626634192), (-36.289055375, -7.218341915))
        make_face()
    cut_extrude_7_tool24 = extrude(cut_extrude_7_sk24.sketch, amount=-CUT_EXTRUDE_7_REACH, mode=Mode.PRIVATE) & part.part
    add(cut_extrude_7_tool1.solids().sort_by_distance((-34.874422, 0, 10.57904))[0], mode=Mode.SUBTRACT)
    add(cut_extrude_7_tool2.solids().sort_by_distance((-32.140452, 0, 17.179429))[0], mode=Mode.SUBTRACT)
    add(cut_extrude_7_tool3.solids().sort_by_distance((-28.171342, 0, 23.119623))[0], mode=Mode.SUBTRACT)
    add(cut_extrude_7_tool4.solids().sort_by_distance((-17.179429, 0, 32.140452))[0], mode=Mode.SUBTRACT)
    add(cut_extrude_7_tool5.solids().sort_by_distance((-10.57904, 0, 34.874422))[0], mode=Mode.SUBTRACT)
    add(cut_extrude_7_tool6.solids().sort_by_distance((-3.572105, 0, 36.268189))[0], mode=Mode.SUBTRACT)
    add(cut_extrude_7_tool7.solids().sort_by_distance((10.57904, 0, 34.874422))[0], mode=Mode.SUBTRACT)
    add(cut_extrude_7_tool8.solids().sort_by_distance((17.179429, 0, 32.140452))[0], mode=Mode.SUBTRACT)
    add(cut_extrude_7_tool9.solids().sort_by_distance((23.119623, 0, 28.171342))[0], mode=Mode.SUBTRACT)
    add(cut_extrude_7_tool10.solids().sort_by_distance((32.140452, 0, 17.179429))[0], mode=Mode.SUBTRACT)
    add(cut_extrude_7_tool11.solids().sort_by_distance((34.874422, 0, 10.57904))[0], mode=Mode.SUBTRACT)
    add(cut_extrude_7_tool12.solids().sort_by_distance((36.268189, 0, 3.572105))[0], mode=Mode.SUBTRACT)
    add(cut_extrude_7_tool13.solids().sort_by_distance((34.874422, 0, -10.57904))[0], mode=Mode.SUBTRACT)
    add(cut_extrude_7_tool14.solids().sort_by_distance((32.140452, 0, -17.179429))[0], mode=Mode.SUBTRACT)
    add(cut_extrude_7_tool15.solids().sort_by_distance((28.171342, 0, -23.119623))[0], mode=Mode.SUBTRACT)
    add(cut_extrude_7_tool16.solids().sort_by_distance((17.179429, 0, -32.140452))[0], mode=Mode.SUBTRACT)
    add(cut_extrude_7_tool17.solids().sort_by_distance((10.57904, 0, -34.874422))[0], mode=Mode.SUBTRACT)
    add(cut_extrude_7_tool18.solids().sort_by_distance((3.572105, 0, -36.268189))[0], mode=Mode.SUBTRACT)
    add(cut_extrude_7_tool19.solids().sort_by_distance((-10.57904, 0, -34.874422))[0], mode=Mode.SUBTRACT)
    add(cut_extrude_7_tool20.solids().sort_by_distance((-17.179429, 0, -32.140452))[0], mode=Mode.SUBTRACT)
    add(cut_extrude_7_tool21.solids().sort_by_distance((-23.119623, 0, -28.171342))[0], mode=Mode.SUBTRACT)
    add(cut_extrude_7_tool22.solids().sort_by_distance((-32.140452, 0, -17.179429))[0], mode=Mode.SUBTRACT)
    add(cut_extrude_7_tool23.solids().sort_by_distance((-34.874422, 0, -10.57904))[0], mode=Mode.SUBTRACT)
    add(cut_extrude_7_tool24.solids().sort_by_distance((-36.268189, 0, -3.572105))[0], mode=Mode.SUBTRACT)


solid = part.part
